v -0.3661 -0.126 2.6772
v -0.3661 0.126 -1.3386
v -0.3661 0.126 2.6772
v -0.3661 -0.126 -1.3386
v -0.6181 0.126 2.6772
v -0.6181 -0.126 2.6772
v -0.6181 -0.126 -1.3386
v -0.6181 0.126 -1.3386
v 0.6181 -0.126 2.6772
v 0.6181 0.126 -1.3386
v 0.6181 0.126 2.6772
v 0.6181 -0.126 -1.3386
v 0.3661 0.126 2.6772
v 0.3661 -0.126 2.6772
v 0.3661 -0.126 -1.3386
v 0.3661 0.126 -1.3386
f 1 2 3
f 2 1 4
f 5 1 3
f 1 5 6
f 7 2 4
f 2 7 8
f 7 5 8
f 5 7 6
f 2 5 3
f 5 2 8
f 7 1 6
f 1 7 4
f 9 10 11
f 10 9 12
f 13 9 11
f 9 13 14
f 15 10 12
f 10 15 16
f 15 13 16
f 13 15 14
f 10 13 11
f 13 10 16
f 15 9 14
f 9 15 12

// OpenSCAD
// file: defines.scad
// example012.stl is Mblock.stl, (c) 2009 Will Langford
// licensed under the Creative Commons - GNU GPL license.
// http://www.thingiverse.com/thing:753

//import("sim800c.stl", convexity=3);

// PCB

A = 2.5;
B = 7.4;

scale = 1/2.54;
// main file
include <defines.scad>

pitch = 2.5;
p_w = 0.64;
p_h = 7.0;

module Pin(x, y) {
  translate([x - p_w/2, y - p_w/2, -3.4])
    cube(size = [p_w, p_w, p_h + 3.2], center = false);
}

// Pins
scale(scale) color("Silver") {
  Pin(-pitch/2, 0);
  Pin( pitch/2, 0);
}
